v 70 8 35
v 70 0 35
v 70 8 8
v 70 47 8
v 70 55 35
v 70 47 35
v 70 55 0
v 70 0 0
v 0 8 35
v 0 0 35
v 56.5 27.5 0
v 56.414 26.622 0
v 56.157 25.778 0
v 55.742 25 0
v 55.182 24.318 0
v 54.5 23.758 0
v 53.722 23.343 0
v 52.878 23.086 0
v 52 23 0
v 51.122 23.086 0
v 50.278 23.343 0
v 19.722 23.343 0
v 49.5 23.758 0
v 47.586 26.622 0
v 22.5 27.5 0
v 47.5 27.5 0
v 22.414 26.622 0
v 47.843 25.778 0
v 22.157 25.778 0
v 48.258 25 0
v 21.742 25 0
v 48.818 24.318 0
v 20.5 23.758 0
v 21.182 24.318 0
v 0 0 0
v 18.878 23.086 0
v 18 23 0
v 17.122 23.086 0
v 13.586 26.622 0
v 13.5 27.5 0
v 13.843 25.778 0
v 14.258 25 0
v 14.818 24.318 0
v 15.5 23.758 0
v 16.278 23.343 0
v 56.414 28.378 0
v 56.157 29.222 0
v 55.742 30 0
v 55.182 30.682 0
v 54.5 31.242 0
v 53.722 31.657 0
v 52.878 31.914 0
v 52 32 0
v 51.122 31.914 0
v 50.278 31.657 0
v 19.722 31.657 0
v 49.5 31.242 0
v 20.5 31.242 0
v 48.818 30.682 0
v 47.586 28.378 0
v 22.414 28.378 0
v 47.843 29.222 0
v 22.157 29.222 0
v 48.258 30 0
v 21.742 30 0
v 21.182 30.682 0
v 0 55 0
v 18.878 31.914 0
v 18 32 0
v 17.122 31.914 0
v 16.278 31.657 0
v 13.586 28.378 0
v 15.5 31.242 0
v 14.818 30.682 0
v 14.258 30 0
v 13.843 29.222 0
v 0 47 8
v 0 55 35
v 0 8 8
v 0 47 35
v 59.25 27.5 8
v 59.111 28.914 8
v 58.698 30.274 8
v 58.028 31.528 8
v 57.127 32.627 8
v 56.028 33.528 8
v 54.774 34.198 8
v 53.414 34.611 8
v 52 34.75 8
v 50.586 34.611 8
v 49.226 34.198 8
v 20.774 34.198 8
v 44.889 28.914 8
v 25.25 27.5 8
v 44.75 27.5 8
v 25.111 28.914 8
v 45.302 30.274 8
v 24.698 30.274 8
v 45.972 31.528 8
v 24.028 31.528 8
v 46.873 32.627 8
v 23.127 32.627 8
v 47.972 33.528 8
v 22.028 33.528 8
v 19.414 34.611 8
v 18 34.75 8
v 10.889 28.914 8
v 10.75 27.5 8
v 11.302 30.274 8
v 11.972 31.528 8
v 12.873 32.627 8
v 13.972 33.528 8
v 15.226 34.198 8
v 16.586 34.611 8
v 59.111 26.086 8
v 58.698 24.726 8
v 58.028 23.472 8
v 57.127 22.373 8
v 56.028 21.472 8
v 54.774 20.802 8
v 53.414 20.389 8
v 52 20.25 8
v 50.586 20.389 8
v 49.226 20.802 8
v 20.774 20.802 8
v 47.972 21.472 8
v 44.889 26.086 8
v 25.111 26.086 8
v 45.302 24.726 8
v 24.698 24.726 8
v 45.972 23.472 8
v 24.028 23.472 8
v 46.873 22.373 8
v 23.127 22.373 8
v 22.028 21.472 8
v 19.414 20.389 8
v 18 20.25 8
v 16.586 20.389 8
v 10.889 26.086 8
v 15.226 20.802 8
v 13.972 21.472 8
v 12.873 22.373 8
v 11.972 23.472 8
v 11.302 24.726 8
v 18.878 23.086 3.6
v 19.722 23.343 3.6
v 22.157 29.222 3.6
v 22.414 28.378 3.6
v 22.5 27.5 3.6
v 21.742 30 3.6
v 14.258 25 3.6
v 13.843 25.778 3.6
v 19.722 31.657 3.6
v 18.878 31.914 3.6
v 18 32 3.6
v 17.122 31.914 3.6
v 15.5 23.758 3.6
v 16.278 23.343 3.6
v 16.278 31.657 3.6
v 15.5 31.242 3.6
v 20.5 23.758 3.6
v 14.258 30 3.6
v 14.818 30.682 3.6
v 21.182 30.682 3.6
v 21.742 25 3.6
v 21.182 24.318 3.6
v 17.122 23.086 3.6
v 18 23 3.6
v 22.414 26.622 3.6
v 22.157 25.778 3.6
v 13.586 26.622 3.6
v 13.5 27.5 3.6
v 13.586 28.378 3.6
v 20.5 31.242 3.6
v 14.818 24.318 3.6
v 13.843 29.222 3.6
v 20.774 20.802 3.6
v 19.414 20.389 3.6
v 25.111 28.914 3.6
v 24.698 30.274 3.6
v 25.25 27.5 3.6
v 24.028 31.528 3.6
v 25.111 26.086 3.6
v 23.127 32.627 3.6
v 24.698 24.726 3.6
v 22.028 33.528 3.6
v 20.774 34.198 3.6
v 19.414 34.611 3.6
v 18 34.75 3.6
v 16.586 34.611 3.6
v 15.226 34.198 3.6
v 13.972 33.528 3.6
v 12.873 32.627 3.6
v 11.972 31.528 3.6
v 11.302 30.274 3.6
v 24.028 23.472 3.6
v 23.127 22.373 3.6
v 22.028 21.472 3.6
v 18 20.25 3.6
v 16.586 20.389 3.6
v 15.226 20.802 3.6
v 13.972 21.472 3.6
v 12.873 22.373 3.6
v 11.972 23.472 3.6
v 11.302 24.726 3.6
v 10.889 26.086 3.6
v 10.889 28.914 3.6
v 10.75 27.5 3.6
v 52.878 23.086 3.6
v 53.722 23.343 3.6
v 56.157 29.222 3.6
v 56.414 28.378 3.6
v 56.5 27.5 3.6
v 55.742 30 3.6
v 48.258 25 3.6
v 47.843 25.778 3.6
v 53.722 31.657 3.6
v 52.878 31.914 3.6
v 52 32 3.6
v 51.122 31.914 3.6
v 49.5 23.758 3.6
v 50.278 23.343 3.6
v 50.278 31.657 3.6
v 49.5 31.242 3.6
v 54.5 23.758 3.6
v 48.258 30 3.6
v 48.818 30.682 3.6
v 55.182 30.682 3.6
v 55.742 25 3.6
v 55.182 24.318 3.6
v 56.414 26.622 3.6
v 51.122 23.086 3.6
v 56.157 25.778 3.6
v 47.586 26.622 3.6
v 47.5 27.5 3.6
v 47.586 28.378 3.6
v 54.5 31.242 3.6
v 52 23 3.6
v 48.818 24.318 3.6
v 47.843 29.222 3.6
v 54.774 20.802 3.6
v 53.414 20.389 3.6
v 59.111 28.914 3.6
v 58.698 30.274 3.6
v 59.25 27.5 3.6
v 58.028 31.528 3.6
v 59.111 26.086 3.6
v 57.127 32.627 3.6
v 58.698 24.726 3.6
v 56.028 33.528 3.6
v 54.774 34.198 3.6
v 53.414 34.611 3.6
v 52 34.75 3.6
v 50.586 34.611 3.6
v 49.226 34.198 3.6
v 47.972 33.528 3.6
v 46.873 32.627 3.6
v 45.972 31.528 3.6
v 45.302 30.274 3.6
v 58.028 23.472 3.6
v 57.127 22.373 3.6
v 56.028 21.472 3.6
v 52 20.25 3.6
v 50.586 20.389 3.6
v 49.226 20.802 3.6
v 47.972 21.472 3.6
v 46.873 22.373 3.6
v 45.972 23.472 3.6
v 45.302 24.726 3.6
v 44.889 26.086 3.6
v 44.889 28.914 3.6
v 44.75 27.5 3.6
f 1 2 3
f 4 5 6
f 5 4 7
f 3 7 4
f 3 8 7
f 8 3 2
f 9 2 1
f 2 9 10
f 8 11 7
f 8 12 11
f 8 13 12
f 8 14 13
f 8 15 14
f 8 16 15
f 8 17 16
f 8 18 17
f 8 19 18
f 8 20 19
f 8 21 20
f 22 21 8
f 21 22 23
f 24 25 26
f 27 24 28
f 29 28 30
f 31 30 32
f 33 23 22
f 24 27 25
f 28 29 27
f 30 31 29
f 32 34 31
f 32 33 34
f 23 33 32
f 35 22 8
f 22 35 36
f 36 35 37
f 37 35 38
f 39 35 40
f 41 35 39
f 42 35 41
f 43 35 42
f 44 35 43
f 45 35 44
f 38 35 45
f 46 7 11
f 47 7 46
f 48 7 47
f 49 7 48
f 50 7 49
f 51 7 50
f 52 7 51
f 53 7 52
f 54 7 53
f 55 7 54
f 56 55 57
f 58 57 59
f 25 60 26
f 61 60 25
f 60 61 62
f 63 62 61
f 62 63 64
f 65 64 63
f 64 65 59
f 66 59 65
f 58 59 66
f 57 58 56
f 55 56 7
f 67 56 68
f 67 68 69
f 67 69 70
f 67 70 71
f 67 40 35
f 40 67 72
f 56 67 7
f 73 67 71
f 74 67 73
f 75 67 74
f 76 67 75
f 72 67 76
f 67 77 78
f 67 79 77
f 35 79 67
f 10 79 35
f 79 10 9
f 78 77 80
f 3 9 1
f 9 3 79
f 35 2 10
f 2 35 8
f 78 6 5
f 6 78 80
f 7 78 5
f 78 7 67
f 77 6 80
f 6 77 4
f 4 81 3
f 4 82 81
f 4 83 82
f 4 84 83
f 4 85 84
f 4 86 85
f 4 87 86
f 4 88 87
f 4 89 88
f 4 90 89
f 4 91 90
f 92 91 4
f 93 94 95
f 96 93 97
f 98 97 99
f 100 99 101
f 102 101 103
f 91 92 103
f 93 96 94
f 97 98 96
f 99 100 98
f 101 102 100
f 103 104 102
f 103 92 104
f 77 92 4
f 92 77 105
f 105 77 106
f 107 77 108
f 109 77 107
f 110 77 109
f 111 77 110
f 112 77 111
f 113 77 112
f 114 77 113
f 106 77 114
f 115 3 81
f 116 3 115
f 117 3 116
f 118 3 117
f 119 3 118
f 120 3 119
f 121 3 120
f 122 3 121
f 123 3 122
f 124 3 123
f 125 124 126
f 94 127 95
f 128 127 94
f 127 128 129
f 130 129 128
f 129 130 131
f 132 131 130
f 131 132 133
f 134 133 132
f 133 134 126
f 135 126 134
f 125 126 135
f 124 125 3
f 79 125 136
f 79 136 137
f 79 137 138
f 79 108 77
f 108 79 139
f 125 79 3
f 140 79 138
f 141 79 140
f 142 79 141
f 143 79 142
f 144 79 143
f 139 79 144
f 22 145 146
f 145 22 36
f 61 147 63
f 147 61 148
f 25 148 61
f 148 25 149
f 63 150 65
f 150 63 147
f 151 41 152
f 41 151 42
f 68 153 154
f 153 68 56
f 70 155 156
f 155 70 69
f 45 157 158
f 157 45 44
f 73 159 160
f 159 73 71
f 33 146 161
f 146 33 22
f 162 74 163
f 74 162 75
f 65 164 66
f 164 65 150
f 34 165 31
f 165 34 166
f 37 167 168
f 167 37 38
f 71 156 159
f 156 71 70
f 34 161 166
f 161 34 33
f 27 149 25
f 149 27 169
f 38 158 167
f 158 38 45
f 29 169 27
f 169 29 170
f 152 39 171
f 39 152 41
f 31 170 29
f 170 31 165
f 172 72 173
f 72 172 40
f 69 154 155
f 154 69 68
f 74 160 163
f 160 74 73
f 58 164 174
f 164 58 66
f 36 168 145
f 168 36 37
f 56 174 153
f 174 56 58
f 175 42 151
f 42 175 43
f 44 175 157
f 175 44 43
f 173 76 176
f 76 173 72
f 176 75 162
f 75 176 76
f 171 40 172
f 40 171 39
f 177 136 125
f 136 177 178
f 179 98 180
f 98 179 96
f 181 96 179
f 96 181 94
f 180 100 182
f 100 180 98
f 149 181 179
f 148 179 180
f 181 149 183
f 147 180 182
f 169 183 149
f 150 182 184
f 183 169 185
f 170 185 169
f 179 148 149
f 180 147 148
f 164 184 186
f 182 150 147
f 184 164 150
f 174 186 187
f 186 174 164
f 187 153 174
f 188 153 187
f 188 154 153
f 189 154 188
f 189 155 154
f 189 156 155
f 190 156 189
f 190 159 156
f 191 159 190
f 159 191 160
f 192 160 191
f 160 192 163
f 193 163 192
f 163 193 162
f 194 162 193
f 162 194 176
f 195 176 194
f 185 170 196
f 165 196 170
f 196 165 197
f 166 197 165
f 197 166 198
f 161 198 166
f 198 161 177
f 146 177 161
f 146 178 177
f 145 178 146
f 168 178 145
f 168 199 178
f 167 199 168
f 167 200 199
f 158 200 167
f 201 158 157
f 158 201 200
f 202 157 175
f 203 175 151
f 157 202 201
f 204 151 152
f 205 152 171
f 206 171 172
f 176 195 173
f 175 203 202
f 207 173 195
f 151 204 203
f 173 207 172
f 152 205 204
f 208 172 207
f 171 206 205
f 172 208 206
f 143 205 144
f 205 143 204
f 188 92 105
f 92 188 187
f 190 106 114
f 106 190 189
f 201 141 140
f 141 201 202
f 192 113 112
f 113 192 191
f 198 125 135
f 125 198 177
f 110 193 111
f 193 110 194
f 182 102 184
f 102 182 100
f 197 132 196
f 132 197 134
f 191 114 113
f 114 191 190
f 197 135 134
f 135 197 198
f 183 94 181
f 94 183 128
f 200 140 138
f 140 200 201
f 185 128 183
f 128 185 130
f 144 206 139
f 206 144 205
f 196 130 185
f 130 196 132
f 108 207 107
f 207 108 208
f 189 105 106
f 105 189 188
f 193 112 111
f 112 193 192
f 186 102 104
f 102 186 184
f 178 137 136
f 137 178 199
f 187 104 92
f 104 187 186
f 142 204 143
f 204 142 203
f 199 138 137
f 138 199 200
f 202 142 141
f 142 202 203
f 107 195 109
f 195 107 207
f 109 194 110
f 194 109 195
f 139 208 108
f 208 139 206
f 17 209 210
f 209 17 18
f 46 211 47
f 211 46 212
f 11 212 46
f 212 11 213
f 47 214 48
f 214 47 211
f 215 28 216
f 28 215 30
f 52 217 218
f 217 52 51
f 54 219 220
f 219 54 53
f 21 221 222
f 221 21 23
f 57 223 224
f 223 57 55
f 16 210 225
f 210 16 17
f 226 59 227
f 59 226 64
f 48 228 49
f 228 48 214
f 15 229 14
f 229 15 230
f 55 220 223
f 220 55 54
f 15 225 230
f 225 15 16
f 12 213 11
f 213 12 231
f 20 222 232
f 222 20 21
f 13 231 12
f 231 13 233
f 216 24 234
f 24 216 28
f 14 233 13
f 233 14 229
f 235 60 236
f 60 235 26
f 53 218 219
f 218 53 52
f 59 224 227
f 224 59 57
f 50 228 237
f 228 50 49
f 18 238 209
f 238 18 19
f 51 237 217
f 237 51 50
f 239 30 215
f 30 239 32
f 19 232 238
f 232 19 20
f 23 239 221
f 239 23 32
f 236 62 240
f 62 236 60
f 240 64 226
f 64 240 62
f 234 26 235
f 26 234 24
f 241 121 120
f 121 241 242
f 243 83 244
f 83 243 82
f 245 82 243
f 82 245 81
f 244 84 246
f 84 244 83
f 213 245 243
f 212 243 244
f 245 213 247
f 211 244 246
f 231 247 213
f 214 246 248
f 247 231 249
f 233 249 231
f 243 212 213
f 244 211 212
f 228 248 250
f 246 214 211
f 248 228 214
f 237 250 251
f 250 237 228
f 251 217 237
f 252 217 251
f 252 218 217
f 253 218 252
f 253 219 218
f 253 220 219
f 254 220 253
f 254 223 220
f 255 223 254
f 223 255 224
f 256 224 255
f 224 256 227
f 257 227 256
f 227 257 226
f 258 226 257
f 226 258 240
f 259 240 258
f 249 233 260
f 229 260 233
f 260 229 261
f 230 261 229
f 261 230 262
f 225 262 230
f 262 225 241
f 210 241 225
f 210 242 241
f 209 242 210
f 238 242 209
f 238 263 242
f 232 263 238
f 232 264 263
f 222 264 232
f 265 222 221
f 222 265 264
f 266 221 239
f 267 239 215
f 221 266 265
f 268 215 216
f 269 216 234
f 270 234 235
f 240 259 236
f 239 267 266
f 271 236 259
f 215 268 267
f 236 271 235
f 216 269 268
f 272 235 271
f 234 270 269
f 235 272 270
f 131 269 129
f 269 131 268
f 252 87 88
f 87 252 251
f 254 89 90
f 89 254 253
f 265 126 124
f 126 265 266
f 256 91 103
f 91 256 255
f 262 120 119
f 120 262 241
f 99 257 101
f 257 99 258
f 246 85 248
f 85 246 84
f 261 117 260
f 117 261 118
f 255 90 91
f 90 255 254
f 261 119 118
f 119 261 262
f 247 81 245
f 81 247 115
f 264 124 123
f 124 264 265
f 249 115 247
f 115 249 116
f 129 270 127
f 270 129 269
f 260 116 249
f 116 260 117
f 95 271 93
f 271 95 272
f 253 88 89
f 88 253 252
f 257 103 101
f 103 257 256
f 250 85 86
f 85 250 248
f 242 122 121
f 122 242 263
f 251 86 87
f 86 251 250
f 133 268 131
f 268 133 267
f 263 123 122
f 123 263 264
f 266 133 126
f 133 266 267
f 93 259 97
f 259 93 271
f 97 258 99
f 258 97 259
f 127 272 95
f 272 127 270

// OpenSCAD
$fn = 32;

// ----------------------------------------------------------------------
// U-bracket: 70 x 55 x 35 mm
// ----------------------------------------------------------------------

// --- parameters (mm) ---
rail_len = 70;            // outer length, X
jaw_w = 55;               // outer width, Y
jaw_h = 35;               // upright height, Z
web_t = 8;                // wall thickness
hole_d = 9;               // clearance for M8
cb_d = 14.5;              // counterbore diameter
cb_h = 4.4;               // counterbore depth

module hole_z(px, py) {
  translate([px, py, -0.5]) cylinder(h = web_t + 1, d = hole_d);
}
module hole_y_pz(pz) {
  /* through both uprights along Y */
  translate([0, -0.5, pz]) rotate([-90, 0, 0]) cylinder(h = jaw_w + 1, d = hole_d);
}
module cb_z(px, py) {
  translate([px, py, web_t - cb_h]) cylinder(h = cb_h + 0.4, d = cb_d);
}

module base() {
  cube([rail_len, jaw_w, web_t]);
}

module uprights() {
  cube([rail_len, web_t, jaw_h]);
  translate([0, jaw_w - web_t, 0]) cube([rail_len, web_t, jaw_h]);
}

difference() {
  union() {
    base();
    uprights();
  }
  hole_z(18, 27.5);
  cb_z(18, 27.5);
  hole_z(52, 27.5);
  cb_z(52, 27.5);
}
